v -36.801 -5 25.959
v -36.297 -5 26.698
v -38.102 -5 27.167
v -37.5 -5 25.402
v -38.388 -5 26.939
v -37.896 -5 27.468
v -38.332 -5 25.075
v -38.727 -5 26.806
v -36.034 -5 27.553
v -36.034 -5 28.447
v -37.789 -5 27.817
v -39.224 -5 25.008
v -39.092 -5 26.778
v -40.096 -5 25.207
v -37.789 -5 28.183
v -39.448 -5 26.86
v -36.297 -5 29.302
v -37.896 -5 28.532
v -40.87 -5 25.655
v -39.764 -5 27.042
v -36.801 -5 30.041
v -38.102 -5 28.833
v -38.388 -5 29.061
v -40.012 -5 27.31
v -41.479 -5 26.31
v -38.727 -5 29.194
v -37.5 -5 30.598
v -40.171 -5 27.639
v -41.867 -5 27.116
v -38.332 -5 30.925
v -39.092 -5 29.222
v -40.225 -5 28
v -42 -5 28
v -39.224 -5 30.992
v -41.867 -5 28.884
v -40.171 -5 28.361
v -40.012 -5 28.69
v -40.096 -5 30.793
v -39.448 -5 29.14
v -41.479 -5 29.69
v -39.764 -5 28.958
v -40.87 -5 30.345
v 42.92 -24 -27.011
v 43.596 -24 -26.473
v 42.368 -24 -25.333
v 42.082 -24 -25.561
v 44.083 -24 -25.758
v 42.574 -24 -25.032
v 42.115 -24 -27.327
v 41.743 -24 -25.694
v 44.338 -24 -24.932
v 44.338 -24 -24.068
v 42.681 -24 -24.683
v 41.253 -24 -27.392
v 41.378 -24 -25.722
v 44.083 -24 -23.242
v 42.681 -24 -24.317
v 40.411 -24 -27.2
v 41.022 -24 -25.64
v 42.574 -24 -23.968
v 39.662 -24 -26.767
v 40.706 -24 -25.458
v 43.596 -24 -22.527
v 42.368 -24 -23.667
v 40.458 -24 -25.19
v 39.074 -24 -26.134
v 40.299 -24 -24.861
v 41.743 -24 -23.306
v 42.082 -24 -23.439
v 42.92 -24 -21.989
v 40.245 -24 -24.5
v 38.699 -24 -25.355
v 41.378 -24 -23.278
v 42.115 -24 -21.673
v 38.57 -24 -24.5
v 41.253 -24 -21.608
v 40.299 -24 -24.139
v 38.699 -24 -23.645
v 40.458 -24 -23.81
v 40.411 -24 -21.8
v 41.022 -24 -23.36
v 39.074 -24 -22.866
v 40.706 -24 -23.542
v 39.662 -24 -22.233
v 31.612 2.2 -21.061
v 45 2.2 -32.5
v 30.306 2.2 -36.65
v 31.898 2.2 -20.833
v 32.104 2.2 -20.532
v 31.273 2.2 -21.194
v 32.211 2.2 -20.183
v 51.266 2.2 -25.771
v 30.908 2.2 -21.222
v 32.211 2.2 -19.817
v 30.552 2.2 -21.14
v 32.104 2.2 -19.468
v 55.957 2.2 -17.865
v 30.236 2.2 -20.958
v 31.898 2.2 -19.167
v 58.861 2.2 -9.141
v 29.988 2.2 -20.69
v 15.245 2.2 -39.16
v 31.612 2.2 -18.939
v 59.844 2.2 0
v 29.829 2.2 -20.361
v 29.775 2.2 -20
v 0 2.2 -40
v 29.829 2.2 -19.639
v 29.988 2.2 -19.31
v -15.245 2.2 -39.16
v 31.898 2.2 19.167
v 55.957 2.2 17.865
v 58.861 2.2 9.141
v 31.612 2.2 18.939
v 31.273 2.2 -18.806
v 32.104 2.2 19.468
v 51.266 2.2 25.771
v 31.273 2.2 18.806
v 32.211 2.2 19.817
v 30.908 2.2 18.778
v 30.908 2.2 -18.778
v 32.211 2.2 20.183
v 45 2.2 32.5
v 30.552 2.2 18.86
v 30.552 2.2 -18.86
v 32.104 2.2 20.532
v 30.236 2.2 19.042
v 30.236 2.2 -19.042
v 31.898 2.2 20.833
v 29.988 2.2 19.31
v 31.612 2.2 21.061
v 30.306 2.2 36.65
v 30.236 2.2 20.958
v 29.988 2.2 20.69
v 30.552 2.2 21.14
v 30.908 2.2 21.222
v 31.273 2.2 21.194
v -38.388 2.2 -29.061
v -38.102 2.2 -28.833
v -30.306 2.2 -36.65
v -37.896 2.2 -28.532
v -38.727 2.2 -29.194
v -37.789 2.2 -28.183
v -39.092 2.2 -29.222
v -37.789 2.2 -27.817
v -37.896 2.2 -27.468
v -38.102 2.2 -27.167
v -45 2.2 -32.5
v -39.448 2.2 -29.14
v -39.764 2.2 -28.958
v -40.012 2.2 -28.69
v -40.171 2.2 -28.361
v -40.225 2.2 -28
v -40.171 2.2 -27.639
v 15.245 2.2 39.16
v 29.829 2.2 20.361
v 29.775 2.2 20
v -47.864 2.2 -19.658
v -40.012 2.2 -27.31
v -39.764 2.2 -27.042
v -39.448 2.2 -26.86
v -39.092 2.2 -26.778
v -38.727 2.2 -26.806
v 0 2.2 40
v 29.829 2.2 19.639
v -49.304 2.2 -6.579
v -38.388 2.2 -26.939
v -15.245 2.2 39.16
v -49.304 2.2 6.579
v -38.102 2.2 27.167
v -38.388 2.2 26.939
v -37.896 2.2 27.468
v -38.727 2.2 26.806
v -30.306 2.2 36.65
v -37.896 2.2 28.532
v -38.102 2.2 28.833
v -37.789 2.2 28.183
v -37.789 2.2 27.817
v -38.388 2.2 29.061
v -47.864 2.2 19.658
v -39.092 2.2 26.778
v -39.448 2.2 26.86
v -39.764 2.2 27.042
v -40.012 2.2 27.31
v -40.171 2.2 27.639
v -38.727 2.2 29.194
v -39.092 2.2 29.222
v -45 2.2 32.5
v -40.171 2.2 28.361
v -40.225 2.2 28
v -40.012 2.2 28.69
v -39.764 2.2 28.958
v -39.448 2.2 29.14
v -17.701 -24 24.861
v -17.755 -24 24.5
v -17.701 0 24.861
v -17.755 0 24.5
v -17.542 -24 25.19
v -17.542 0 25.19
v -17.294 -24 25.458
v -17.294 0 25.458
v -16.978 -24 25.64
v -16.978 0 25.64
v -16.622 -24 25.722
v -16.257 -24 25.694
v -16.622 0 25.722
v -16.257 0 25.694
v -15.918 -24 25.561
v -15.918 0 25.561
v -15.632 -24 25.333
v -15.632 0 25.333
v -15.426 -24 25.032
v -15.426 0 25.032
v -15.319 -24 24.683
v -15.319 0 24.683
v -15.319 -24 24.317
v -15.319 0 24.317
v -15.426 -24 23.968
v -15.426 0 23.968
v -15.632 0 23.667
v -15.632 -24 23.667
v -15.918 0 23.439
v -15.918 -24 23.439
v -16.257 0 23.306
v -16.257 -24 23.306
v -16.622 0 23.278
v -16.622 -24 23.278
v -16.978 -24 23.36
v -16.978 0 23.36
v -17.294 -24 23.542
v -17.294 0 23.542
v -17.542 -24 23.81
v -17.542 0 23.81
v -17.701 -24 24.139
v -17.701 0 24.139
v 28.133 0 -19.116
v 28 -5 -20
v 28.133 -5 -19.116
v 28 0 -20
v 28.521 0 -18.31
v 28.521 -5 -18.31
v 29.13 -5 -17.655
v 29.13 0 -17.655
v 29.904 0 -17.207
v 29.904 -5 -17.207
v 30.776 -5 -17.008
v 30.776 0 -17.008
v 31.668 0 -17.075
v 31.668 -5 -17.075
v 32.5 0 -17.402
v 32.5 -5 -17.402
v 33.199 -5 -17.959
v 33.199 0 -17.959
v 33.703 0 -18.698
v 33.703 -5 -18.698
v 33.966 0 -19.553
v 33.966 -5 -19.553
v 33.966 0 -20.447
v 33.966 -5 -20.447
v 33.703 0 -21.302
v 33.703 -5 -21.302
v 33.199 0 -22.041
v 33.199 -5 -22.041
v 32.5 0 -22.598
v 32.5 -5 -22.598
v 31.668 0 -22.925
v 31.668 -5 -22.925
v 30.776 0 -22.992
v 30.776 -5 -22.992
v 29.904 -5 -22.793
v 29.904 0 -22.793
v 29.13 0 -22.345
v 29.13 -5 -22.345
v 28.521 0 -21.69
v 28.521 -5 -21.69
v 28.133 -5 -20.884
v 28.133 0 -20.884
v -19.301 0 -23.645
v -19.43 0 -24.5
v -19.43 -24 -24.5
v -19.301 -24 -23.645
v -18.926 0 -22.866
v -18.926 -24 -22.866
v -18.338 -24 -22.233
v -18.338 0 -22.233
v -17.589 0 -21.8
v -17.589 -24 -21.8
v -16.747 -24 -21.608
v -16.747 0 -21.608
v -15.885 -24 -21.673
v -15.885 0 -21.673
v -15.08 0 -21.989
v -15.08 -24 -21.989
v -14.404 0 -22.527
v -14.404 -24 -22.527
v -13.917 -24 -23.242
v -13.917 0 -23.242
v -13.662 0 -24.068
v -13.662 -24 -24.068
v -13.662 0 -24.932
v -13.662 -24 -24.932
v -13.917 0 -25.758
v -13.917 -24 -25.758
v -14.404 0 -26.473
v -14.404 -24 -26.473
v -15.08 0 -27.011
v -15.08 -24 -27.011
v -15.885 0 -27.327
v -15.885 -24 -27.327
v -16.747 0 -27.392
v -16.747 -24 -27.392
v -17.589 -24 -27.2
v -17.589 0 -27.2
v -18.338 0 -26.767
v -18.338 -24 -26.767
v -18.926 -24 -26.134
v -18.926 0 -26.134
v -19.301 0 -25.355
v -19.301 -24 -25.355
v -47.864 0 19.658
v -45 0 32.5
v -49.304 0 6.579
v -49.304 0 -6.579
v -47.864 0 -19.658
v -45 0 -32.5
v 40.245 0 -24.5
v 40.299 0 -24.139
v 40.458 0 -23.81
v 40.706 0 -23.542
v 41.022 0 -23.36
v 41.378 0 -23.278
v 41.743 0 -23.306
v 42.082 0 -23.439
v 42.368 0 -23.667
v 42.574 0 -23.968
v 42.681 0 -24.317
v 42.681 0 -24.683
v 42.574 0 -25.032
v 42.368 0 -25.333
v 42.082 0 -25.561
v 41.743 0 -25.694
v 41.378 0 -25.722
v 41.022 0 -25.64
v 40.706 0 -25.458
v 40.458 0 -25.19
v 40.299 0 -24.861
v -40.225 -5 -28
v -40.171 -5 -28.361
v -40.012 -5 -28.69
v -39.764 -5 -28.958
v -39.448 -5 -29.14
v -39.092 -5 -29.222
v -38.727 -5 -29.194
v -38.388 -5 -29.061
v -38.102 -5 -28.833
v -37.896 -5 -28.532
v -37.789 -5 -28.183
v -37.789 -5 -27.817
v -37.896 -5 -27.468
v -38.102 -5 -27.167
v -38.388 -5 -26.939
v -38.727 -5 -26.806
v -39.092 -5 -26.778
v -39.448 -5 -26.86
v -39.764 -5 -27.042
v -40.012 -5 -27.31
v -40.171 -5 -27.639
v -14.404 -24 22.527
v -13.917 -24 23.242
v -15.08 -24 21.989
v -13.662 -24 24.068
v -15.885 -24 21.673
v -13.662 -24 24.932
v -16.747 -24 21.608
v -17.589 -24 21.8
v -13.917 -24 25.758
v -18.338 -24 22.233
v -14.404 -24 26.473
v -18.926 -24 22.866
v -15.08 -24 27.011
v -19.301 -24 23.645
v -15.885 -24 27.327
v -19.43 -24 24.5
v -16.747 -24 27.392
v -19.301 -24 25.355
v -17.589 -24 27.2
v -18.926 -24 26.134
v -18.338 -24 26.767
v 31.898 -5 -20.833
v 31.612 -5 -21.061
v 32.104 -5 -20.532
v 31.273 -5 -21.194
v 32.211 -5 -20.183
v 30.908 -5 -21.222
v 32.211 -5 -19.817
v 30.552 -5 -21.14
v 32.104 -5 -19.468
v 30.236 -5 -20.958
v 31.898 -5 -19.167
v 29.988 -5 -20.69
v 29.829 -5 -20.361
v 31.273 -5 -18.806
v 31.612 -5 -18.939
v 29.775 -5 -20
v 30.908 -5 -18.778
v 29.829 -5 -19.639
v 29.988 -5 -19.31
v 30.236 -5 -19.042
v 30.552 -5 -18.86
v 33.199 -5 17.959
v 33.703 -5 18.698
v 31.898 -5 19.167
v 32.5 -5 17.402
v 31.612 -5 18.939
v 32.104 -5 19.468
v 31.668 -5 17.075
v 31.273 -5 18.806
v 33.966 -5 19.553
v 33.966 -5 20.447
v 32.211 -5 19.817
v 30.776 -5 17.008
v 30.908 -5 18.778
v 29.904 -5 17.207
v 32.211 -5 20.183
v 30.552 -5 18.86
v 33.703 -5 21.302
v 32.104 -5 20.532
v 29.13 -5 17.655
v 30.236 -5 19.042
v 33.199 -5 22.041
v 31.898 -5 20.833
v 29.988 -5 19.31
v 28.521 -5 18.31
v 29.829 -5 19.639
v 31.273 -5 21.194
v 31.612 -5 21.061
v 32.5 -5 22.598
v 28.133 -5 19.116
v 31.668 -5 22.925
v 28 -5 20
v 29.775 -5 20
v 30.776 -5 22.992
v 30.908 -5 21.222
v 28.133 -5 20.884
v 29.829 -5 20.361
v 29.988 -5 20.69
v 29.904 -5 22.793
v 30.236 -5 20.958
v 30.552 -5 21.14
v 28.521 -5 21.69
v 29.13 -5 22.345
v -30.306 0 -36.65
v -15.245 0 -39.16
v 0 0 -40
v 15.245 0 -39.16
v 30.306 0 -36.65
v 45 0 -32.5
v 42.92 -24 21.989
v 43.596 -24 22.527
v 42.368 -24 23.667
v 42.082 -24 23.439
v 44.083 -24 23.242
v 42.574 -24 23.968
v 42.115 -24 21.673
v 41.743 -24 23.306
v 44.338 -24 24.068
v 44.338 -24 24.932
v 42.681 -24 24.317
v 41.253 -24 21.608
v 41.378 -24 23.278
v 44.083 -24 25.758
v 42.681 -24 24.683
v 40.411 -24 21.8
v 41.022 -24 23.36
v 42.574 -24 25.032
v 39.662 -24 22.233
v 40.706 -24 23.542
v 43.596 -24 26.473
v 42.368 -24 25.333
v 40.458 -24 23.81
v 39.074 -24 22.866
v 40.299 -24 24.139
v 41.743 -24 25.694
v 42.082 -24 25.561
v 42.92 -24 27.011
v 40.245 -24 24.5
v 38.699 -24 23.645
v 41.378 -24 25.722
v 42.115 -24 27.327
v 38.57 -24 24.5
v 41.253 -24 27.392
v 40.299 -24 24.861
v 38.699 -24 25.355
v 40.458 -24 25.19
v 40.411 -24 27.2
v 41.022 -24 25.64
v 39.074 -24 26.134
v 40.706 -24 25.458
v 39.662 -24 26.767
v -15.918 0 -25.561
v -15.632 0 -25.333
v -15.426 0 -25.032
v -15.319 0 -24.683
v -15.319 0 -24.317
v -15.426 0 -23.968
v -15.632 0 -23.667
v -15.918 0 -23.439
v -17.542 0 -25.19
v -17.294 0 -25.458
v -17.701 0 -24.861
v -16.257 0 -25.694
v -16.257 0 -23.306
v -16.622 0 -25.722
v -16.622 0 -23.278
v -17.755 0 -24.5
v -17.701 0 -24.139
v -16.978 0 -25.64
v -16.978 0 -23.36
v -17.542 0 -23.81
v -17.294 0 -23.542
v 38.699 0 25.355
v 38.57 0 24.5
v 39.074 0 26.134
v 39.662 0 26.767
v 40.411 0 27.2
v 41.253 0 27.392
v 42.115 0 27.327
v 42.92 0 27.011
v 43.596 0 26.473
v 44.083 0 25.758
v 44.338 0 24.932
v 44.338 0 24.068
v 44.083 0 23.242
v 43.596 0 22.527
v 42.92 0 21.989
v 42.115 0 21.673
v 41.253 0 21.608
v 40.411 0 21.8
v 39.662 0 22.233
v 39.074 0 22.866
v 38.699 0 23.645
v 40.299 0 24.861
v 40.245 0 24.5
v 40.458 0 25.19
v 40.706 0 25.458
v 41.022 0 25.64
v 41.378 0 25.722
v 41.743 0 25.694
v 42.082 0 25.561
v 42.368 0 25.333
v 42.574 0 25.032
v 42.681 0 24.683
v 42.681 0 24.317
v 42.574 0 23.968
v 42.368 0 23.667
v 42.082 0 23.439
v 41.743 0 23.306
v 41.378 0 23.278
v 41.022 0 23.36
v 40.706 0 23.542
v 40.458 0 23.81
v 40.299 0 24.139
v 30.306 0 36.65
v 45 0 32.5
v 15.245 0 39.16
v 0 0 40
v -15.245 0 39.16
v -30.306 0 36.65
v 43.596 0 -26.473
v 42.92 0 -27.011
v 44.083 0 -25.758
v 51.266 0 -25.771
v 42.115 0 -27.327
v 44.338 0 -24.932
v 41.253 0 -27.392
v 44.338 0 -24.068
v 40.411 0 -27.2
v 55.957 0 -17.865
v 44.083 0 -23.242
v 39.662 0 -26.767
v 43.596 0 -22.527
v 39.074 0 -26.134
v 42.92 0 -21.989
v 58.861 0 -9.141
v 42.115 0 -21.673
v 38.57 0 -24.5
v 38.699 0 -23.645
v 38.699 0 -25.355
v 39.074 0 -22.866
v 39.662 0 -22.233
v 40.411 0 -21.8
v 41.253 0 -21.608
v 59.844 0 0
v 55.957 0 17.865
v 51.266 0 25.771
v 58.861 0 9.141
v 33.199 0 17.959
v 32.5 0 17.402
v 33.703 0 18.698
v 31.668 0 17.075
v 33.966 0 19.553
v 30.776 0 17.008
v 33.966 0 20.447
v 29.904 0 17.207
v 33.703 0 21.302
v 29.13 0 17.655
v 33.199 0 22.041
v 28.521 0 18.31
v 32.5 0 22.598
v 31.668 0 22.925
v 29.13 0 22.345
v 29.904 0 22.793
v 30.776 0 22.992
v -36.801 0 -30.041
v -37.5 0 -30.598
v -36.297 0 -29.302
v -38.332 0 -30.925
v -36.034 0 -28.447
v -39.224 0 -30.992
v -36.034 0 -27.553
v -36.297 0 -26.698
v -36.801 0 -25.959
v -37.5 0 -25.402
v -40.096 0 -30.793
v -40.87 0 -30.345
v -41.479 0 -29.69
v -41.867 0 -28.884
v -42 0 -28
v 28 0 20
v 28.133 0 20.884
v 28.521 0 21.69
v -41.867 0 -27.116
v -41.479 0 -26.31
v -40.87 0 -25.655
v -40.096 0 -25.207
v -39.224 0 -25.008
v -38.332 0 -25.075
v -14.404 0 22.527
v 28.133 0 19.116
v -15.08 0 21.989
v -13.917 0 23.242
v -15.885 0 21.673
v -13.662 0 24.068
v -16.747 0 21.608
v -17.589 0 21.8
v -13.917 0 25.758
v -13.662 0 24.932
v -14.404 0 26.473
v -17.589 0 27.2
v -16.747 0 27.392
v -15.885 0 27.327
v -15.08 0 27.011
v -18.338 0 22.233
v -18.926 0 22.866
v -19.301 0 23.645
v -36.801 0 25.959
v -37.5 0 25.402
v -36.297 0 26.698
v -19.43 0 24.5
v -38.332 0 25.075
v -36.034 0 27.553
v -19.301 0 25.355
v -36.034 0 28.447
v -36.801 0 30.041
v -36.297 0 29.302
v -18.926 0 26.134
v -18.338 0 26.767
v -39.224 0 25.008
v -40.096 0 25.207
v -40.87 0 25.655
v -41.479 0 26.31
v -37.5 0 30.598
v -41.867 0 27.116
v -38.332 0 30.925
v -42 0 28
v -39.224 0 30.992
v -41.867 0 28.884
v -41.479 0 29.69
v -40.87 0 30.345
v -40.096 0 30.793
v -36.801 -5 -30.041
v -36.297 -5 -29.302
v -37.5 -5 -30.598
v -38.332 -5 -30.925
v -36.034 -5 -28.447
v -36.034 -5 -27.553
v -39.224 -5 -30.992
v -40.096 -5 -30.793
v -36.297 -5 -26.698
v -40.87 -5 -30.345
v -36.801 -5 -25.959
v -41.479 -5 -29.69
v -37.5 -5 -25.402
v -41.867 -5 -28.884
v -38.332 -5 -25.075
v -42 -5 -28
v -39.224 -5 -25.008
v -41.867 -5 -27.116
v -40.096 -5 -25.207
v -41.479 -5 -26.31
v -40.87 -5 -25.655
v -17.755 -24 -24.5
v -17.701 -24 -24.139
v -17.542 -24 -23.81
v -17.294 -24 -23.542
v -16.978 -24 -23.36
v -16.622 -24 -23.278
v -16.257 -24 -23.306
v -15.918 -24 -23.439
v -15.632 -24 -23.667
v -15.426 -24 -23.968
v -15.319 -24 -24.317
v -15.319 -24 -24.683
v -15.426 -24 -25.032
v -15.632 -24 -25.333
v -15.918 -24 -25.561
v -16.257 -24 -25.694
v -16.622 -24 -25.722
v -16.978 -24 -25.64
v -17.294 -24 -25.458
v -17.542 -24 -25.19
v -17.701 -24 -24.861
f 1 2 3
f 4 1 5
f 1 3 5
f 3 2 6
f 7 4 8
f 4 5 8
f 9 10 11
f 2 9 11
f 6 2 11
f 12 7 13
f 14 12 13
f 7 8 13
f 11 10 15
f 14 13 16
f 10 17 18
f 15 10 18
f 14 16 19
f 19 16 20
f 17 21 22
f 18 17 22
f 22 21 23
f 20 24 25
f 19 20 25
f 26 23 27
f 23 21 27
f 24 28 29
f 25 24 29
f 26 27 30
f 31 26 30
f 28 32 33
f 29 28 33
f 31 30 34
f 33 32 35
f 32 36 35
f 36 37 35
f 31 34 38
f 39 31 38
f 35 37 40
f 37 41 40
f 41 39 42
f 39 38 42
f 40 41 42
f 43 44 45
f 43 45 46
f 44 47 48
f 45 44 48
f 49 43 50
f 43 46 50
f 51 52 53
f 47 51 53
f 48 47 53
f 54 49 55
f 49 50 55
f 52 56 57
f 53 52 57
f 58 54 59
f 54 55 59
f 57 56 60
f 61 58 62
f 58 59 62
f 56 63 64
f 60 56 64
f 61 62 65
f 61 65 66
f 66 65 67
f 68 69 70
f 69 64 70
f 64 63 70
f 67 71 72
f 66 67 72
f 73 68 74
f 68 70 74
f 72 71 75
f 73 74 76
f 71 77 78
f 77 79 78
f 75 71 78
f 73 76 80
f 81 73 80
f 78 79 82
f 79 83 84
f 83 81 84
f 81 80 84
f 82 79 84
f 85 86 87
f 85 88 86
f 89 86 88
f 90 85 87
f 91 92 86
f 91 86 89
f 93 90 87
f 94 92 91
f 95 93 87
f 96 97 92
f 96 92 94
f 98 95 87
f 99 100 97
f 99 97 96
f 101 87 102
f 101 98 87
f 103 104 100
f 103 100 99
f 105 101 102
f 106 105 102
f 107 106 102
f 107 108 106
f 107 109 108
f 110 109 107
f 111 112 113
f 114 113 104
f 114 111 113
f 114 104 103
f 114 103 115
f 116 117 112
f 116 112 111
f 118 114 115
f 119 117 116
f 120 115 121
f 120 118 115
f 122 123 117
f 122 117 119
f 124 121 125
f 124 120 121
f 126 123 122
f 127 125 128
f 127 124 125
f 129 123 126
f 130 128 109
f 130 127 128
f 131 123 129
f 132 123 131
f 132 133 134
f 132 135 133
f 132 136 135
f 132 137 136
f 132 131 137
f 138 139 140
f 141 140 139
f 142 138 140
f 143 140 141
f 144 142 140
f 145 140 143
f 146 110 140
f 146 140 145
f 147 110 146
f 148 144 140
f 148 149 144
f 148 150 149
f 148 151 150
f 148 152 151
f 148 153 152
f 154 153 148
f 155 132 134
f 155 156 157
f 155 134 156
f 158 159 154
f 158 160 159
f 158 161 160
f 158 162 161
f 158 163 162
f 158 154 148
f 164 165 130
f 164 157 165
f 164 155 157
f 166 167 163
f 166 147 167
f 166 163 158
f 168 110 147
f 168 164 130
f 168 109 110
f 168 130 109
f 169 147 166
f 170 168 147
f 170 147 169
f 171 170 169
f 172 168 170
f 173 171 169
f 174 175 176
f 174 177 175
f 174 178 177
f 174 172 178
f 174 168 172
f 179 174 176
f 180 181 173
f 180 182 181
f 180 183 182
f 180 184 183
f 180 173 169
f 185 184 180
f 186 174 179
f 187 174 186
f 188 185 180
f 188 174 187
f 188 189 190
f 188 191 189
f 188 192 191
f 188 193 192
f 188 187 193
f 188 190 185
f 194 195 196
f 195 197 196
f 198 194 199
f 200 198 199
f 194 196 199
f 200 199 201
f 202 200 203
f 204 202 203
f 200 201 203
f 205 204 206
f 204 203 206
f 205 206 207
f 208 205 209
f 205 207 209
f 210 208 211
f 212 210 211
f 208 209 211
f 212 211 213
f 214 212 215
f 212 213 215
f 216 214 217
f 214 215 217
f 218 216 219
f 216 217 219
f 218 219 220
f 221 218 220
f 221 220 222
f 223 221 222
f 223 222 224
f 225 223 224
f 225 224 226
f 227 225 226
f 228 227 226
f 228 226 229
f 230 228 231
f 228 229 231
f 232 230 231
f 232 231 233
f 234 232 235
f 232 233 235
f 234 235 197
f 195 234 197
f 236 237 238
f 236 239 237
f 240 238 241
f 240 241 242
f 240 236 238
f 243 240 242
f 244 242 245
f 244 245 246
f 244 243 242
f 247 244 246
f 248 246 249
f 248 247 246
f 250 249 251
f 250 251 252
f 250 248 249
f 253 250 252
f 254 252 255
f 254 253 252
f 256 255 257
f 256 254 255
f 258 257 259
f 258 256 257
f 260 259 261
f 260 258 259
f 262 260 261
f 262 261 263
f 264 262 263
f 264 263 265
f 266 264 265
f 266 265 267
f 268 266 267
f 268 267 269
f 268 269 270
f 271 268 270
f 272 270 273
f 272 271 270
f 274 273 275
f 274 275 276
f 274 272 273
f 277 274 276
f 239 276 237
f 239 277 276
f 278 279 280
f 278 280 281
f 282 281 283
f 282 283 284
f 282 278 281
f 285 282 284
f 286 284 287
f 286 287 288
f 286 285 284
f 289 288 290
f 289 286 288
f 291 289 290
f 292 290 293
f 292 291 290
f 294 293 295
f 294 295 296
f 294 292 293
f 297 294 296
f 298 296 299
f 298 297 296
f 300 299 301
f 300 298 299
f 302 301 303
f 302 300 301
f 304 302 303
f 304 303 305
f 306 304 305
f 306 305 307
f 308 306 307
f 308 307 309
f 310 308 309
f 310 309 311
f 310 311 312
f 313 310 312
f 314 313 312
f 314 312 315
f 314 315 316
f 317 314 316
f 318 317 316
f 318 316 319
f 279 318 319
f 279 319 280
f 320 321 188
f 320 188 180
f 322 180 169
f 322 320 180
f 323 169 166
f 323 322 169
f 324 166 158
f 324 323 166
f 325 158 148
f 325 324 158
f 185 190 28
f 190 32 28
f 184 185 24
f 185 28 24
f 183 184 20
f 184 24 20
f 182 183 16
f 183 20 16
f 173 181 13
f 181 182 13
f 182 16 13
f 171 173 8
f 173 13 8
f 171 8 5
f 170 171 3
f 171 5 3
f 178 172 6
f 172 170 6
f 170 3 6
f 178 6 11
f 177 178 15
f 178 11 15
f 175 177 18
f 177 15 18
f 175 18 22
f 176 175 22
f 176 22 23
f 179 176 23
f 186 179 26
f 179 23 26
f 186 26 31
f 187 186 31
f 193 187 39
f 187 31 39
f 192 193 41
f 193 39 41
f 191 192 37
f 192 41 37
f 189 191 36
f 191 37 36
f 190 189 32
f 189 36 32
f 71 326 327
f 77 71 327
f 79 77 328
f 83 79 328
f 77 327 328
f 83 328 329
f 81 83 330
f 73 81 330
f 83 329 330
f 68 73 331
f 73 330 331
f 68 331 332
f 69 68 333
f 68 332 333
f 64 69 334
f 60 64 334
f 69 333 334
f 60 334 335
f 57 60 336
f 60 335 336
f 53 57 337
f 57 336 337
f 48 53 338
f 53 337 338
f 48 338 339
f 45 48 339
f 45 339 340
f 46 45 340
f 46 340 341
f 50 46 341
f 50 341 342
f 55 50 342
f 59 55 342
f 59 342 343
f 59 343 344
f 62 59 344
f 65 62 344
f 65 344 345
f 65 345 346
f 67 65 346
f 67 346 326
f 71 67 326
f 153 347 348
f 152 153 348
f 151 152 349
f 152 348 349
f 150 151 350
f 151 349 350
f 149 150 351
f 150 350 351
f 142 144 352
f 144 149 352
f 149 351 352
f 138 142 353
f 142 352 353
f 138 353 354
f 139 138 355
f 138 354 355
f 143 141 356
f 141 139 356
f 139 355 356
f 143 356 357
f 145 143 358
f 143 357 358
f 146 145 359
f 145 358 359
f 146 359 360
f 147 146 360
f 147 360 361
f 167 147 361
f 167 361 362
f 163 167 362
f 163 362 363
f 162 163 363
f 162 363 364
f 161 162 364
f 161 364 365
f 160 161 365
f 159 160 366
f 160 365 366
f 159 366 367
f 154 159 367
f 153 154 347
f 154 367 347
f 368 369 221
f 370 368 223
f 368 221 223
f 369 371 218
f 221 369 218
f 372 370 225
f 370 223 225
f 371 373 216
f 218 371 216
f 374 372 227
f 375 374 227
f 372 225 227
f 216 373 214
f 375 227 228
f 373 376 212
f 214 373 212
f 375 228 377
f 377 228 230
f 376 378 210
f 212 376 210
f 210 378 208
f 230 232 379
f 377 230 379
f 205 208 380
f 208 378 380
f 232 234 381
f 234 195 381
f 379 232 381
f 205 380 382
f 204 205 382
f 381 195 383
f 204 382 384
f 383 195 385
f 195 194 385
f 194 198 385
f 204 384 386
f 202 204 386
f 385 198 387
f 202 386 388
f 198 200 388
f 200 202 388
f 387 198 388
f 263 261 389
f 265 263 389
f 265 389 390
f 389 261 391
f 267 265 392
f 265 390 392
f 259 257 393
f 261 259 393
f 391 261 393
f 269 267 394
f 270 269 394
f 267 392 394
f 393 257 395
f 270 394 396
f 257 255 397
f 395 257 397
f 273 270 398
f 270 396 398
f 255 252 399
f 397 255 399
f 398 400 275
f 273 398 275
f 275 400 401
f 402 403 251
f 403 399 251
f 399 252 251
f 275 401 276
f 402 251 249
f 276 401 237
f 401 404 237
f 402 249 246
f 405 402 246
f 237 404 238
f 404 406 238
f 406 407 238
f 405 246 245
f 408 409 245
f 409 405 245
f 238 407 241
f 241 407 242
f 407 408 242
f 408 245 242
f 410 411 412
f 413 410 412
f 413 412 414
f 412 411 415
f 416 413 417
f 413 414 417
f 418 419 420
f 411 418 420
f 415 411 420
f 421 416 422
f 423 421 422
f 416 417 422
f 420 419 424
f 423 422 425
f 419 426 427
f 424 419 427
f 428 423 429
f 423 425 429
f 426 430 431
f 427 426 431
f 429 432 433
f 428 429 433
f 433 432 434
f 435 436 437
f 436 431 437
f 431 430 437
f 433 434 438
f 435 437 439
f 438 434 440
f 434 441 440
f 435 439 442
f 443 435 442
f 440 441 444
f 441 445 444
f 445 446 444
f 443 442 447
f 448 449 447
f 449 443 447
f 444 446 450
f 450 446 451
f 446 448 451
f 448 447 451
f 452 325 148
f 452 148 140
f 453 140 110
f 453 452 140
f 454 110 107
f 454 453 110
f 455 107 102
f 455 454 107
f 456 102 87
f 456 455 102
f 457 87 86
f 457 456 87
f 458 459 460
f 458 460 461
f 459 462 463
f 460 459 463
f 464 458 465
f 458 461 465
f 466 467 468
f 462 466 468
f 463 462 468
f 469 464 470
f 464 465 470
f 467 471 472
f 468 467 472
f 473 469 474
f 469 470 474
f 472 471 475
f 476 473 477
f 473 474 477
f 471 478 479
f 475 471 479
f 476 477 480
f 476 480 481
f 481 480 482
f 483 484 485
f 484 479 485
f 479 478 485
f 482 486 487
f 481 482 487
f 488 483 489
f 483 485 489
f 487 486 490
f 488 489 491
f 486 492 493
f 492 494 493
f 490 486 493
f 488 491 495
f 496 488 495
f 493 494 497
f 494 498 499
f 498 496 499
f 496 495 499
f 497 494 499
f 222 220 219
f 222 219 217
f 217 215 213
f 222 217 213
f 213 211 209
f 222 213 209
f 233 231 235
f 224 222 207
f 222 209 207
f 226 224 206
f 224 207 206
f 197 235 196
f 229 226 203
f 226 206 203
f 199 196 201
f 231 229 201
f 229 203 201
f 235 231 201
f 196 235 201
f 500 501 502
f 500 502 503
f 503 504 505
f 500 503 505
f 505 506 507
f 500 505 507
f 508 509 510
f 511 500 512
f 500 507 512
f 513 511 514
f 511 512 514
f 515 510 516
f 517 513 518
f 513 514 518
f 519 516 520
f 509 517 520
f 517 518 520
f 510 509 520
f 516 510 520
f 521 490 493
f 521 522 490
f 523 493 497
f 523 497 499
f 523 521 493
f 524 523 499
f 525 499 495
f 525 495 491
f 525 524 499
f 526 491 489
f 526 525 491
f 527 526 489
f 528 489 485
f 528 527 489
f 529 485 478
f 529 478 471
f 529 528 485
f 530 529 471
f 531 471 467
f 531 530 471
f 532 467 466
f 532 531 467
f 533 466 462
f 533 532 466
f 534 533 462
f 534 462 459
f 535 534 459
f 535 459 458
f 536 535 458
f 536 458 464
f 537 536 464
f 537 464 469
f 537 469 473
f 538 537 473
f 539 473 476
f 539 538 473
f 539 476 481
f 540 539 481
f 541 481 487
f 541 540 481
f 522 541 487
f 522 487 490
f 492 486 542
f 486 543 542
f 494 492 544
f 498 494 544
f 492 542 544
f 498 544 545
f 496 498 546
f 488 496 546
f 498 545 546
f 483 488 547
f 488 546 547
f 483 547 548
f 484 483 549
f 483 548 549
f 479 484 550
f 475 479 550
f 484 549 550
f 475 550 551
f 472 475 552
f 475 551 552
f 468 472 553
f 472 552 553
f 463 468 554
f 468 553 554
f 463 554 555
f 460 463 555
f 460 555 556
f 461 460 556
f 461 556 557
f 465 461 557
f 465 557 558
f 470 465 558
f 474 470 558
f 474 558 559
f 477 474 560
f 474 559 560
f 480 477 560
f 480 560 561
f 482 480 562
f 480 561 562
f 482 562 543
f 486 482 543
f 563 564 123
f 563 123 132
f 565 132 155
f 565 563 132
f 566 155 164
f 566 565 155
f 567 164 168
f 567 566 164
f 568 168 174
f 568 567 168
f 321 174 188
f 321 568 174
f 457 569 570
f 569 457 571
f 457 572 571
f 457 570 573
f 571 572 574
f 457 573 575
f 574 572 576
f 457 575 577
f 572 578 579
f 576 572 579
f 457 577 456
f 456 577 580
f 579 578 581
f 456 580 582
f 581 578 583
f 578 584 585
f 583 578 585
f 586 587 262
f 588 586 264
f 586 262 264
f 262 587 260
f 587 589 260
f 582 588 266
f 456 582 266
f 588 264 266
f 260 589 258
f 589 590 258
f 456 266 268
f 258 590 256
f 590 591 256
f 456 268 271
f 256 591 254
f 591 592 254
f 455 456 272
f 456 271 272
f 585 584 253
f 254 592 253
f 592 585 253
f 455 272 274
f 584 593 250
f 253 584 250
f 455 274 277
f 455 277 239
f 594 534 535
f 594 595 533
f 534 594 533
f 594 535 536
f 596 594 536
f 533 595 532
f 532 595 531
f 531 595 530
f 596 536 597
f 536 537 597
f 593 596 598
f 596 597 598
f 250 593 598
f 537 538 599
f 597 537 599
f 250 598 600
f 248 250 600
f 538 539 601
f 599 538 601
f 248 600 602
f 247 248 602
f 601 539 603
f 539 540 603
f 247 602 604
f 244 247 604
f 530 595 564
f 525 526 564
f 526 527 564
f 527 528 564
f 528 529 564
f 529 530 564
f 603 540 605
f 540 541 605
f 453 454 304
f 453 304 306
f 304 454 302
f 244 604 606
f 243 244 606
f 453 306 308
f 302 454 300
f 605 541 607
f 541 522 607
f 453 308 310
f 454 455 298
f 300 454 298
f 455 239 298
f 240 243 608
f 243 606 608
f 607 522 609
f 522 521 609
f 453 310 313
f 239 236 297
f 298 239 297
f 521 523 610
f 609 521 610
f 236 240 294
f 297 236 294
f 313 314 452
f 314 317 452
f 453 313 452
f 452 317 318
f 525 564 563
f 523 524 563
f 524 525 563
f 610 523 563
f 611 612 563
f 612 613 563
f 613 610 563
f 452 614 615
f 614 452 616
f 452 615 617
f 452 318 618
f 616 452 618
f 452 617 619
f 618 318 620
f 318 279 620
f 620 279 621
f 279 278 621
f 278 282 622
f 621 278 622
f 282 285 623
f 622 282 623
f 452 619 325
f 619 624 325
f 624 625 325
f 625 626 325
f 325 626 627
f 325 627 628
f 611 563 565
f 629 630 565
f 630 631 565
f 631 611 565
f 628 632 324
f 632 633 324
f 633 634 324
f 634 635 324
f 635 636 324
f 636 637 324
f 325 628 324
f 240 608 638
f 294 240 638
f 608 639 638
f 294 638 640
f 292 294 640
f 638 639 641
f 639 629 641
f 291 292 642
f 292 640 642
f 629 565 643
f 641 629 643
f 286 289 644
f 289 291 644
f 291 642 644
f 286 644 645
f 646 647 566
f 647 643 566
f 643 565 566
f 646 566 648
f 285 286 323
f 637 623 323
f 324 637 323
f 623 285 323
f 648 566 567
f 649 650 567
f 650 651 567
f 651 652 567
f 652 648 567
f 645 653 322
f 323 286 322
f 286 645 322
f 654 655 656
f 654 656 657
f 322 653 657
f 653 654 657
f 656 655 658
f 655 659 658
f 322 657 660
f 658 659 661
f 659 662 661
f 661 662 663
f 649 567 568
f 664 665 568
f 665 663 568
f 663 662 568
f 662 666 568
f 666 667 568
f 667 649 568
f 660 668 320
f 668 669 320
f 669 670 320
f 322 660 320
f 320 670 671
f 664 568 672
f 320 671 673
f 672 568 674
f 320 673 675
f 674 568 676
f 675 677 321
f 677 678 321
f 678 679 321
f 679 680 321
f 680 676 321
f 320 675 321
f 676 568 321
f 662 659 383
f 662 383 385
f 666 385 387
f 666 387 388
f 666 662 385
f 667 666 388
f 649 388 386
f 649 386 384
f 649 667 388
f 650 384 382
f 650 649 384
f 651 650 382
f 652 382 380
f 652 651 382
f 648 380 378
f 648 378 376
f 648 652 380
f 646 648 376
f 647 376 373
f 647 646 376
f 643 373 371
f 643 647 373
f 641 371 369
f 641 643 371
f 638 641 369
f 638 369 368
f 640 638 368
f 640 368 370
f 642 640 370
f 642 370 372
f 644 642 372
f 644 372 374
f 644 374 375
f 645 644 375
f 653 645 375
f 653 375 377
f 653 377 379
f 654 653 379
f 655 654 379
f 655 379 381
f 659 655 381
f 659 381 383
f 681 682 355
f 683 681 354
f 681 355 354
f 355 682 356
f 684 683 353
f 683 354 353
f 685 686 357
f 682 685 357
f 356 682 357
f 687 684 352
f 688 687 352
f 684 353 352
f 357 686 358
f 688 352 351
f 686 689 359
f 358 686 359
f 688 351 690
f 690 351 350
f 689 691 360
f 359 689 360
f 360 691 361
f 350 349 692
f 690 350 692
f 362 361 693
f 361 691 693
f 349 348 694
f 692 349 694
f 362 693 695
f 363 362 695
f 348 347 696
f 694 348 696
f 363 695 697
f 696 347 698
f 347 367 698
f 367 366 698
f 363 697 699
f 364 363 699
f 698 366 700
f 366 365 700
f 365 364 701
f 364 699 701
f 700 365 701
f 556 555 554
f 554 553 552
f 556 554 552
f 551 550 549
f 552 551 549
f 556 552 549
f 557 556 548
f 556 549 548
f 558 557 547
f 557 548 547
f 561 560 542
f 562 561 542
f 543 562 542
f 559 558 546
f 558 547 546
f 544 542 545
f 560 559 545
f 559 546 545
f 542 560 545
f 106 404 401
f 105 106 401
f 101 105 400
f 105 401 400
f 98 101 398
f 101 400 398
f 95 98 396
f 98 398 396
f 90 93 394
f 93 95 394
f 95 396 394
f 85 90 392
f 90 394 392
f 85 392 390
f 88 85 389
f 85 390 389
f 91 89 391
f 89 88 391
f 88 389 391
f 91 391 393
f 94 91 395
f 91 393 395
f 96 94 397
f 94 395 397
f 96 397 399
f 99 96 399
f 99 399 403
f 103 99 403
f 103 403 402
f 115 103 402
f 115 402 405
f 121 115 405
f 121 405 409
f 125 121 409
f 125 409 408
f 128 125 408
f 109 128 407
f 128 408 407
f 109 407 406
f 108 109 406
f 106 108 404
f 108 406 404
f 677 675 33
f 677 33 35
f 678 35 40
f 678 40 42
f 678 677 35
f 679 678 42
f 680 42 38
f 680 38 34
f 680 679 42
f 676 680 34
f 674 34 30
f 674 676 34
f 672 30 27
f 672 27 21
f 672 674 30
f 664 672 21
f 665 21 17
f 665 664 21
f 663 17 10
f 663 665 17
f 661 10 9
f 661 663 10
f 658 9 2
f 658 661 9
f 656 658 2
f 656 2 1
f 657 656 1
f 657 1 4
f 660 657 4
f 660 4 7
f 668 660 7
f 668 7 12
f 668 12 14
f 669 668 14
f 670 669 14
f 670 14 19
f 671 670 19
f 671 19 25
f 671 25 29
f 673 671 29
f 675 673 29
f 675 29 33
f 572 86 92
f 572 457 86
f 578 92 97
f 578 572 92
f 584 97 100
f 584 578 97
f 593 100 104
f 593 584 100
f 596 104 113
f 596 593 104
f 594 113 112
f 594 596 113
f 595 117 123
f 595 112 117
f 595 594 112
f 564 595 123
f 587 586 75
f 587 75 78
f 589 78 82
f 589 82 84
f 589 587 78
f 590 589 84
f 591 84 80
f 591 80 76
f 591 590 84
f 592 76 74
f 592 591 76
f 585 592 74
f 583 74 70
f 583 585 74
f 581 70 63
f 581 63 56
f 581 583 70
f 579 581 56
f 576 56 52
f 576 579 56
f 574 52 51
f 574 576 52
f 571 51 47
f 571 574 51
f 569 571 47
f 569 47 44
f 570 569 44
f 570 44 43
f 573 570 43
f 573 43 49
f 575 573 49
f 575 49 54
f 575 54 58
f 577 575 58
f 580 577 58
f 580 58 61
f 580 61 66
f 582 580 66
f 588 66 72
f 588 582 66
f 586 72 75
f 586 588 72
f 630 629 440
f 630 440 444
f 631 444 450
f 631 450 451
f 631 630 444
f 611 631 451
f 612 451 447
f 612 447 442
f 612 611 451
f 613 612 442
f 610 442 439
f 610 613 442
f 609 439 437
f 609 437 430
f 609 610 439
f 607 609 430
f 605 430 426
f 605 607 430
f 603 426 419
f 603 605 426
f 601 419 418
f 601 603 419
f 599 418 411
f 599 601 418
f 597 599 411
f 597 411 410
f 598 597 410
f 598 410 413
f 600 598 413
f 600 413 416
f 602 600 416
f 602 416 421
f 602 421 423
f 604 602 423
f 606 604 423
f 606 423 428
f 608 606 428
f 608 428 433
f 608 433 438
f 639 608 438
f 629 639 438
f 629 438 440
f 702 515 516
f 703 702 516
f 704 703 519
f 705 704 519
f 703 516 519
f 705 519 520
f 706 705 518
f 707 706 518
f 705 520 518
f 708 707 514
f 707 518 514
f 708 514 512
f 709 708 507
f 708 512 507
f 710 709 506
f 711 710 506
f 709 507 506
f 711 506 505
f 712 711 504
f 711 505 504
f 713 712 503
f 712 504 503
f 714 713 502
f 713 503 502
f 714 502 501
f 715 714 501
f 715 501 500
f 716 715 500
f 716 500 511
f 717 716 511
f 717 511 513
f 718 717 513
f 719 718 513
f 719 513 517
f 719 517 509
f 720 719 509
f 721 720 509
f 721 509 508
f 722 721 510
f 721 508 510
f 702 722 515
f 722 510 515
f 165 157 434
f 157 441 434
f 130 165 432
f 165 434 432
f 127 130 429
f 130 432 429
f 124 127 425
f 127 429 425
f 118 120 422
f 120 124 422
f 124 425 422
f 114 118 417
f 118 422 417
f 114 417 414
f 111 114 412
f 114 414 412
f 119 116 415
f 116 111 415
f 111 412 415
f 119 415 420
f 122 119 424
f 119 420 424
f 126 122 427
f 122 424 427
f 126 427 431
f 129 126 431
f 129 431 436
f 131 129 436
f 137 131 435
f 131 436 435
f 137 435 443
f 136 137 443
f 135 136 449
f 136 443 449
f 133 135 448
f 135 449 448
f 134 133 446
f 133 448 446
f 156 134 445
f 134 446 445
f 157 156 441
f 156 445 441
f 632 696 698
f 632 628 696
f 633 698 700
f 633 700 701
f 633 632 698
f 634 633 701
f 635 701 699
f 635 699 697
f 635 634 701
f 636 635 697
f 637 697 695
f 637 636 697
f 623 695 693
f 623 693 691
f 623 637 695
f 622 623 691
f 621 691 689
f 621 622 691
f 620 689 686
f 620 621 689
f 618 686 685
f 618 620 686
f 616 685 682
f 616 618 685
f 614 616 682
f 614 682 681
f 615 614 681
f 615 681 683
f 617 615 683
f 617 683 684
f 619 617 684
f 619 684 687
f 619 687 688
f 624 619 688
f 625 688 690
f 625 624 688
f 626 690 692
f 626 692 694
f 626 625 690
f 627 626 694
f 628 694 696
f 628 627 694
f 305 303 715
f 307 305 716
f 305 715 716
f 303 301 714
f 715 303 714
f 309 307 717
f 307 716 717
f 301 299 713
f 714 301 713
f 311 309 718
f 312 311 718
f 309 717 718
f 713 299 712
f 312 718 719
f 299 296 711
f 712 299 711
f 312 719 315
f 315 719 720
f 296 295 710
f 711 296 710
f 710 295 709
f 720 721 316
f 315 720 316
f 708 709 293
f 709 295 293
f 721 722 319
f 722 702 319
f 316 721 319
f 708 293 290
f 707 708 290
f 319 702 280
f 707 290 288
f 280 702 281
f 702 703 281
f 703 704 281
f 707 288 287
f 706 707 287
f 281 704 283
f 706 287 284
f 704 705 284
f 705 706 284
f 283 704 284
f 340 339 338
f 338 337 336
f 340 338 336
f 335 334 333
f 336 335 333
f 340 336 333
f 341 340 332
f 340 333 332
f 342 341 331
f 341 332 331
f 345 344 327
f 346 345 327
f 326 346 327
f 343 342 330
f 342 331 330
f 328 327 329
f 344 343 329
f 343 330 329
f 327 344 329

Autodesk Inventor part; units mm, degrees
ref_plane "YZ Plane" through (0, 0, 0) normal (1, 0, 0) x (0, 1, 0)
ref_plane "XZ Plane" through (0, 0, 0) normal (0, 1, 0) x (-1, 0, 0)
sketch "Skizze4" plane through (0, 0, 0) normal (0, 1, 0) x (-1, 0, 0)
  arc A0 (45, -32.5) -> (45, 32.5) centre (-70.5152, 0) ccw
  arc A1 (45, 32.5) -> (-45, 32.5) centre (0, -98.75) ccw
  arc A2 (-45, 32.5) -> (-45, -32.5) centre (-16.8442, 0) ccw
  line L0 (49.4848, 0) -> (-59.8442, 0) construction
  circle A3 centre (39, -28) radius 1.225
  circle A4 centre (39, 28) radius 1.225
  circle A5 centre (-31, 20) radius 1.225
  circle A6 centre (-31, -20) radius 1.225
  circle A7 centre (16.53, -24.5) radius 1.225
  circle A8 centre (16.53, 24.5) radius 1.225
  circle A9 centre (-41.47, 24.5) radius 1.225
  circle A10 centre (-41.47, -24.5) radius 1.225
  line L1 (39, 28) -> (39, -28) construction
  line L2 (39, -28) -> (-31, -20) construction
  line L3 (-31, -20) -> (-31, 20) construction
  line L4 (-31, 20) -> (39, 28) construction
  line L5 (16.53, 24.5) -> (16.53, -24.5) construction
  line L6 (16.53, -24.5) -> (-41.47, -24.5) construction
  line L7 (-41.47, -24.5) -> (-41.47, 24.5) construction
  line L8 (-41.47, 24.5) -> (16.53, 24.5) construction
  line L9 (0, -40) -> (0, 40) construction
  circle A11 centre (16.53, -24.5) radius 2.9
  circle A12 centre (-41.47, -24.5) radius 2.9
  circle A13 centre (-41.47, 24.5) radius 2.9
  circle A14 centre (16.53, 24.5) radius 2.9
  line L10 (45, 32.5) -> (45, -32.5) construction
  line L11 (-45, 32.5) -> (-45, -32.5) construction
  arc A15 (-45, -32.5) -> (45, -32.5) centre (0, 98.75) ccw
  circle A16 centre (-31, -20) radius 3
  circle A17 centre (-31, 20) radius 3
  circle A18 centre (39, 28) radius 3
  circle A19 centre (39, -28) radius 3
  point P0 (0, 0)
  point P1 (0, 0)
  dimension "d19" = 2.45
  dimension "d20" = 5.8
  dimension "d28" = 80
  dimension "d30" = 90
  dimension "d31" = 58
  dimension "d32" = 49
  dimension "d33" = 56
  dimension "d34" = 40
  dimension "d35" = 70
  dimension "d36" = 65
  dimension "d37" = 65
  dimension "d38" = 22.47
  dimension "d39" = 120
  dimension "d40" = 6
  dimension "d41" = 2.45
  dimension "d42" = 43
  dimension "d58" = 6
sketch "Skizze3" plane through (0, 0, 0) normal (0, 1, 0) x (-1, 0, 0)
  line L0 (-220.6772, -144.4743) -> (-220.6772, -104.4743)
  line L1 (-220.6772, -104.4743) -> (-150.6772, -96.4743)
  line L2 (-150.6772, -96.4743) -> (-150.6772, -152.4743)
  line L3 (-150.6772, -152.4743) -> (-220.6772, -144.4743)
  line L4 (-173.154, -148.9743) -> (-231.154, -148.9743)
  line L5 (-231.154, -148.9743) -> (-231.154, -99.9743)
  line L6 (-231.154, -99.9743) -> (-173.154, -99.9743)
  line L7 (-173.154, -99.9743) -> (-173.154, -148.9743)
  circle A0 centre (-231.154, -99.9743) radius 1.35
  circle A1 centre (-231.154, -148.9743) radius 1.35
  circle A2 centre (-173.154, -148.9743) radius 1.35
  circle A3 centre (-173.154, -99.9743) radius 1.35
  arc A4 (-234.6505, -110.3469) -> (-234.6486, -138.3994) centre (-219.7787, -124.3722) ccw
  line L8 (-234.6505, -110.3469) -> (-234.6458, -99.4805)
  arc A5 (-231.5992, -96.4365) -> (-234.6458, -99.4805) centre (-231.6005, -99.4818) ccw
  line L9 (-231.5992, -96.4365) -> (-212.1876, -96.4449)
  arc A6 (-178.6836, -89.0505) -> (-212.1876, -96.4449) centre (-176.7514, -177.4047) ccw
  arc A7 (-149.827, -93.1805) -> (-178.6836, -89.0505) centre (-181.982, -214.9715) ccw
  arc A8 (-147.411, -95.6063) -> (-149.827, -93.1805) centre (-150.6924, -96.4584) ccw
  arc A9 (-143.2995, -124.3735) -> (-147.411, -95.6063) centre (-273.1451, -128.2544) ccw
  arc A10 (-147.4215, -153.3903) -> (-143.2995, -124.3735) centre (-273.1519, -120.7284) ccw
  arc A11 (-149.7866, -155.739) -> (-147.4215, -153.3903) centre (-150.6843, -152.4698) ccw
  arc A12 (-178.6402, -159.8288) -> (-149.7866, -155.739) centre (-181.7729, -33.9036) ccw
  arc A13 (-212.2336, -152.5079) -> (-178.6402, -159.8288) centre (-176.9785, -71.4691) ccw
  line L10 (-231.6452, -152.4995) -> (-212.2336, -152.5079)
  arc A14 (-234.6534, -149.2659) -> (-231.6452, -152.4995) centre (-231.6139, -149.4543) ccw
  line L11 (-234.6534, -149.2659) -> (-234.6486, -138.3994)
  line L12 (-240.2208, -124.3735) -> (-143.2995, -124.3735) construction
  line L13 (-177.3977, -89.0907) -> (-177.3977, -159.7918) construction
  point P0 (-177.3977, -124.4413)
extrude "Extrusion1" add sketch "Skizze4" along normal blind 2.2 contours A15 A2 A1 A0 | A7 | A8 | A9 | A10 | A11 | A12 | A13 | A14 | A16 | A17 | A18 | A19
extrude "Extrusion2" add sketch "Skizze4" against normal blind 24 contours A11 | A12 | A13 | A14
extrude "Extrusion3" add sketch "Skizze4" against normal blind 5 contours A16 | A17 | A18 | A19
ref_plane "Arbeitsebene1" through (41.47, 0, -24.5) normal (-0.3949, 0, -0.9187) x (0, -1, 0)
sketch "Skizze6" plane through (41.47, 0, -24.5) normal (-0.3949, 0, -0.9187) x (0, -1, 0)
  line L0 (24, 1.2564) -> (24.1406, 1.5)
  line L1 (24.1406, 1.5) -> (24.1969, 1.5)
  line L2 (24.1969, 1.5) -> (24.3375, 1.2564)
  line L3 (24.3375, 1.2564) -> (24.3937, 1.2564)
  line L4 (24.45, 1.2564) -> (24.45, 1.5487) construction
  line L5 (24.45, 1.5487) -> (23.8875, 1.5487) construction
  line L6 (23.8875, 1.5487) -> (23.8875, 1.2564) construction
  line L7 (23.8875, 1.2564) -> (23.9437, 1.2564) construction
  line L8 (23.9437, 1.2564) -> (24, 1.2564)
  line L9 (24.3937, 1.2564) -> (24.45, 1.2564) construction
  line L10 (24, 1.2564) -> (24.3375, 1.2564) construction
  line L11 (24.1406, 1.5) -> (24.1687, 1.5487) construction
  line L12 (24.1969, 1.5) -> (24.1687, 1.5487) construction
  line L13 (23.8875, 0) -> (24.45, 0) construction
  line L14 (23.8875, 1.2564) -> (23.9437, 1.159) construction
  line L15 (23.9437, 1.159) -> (24, 1.2564) construction
  line L16 (24.3375, 1.2564) -> (24.3937, 1.159) construction
  line L17 (24.3937, 1.159) -> (24.45, 1.2564) construction
  line L18 (24.1687, 1.2564) -> (24.1687, 1.5487) construction
  line L19 (23.9437, 1.159) -> (24.3937, 1.159) construction
  line L20 (23.8875, 0) -> (23.8875, 1.2564) construction
  line L21 (24.45, 0) -> (24.45, 1.2564) construction
  line L22 (-7.98, 0) -> (29.33, 0) projected
  line L23 (24, 1.225) -> (24, -1.225) projected
  line L24 (24, 1.2564) -> (24.3375, 1.2564)
  line L25 (-2.5375, 12.6525) -> (-2.3969, 12.8961)
  line L26 (-2.3969, 12.8961) -> (-2.3406, 12.8961)
  line L27 (-2.3406, 12.8961) -> (-2.2, 12.6525)
  line L28 (-2.2, 12.6525) -> (-2.1437, 12.6525)
  line L29 (-2.0875, 12.6525) -> (-2.0875, 12.9448) construction
  line L30 (-2.0875, 12.9448) -> (-2.65, 12.9448) construction
  line L31 (-2.65, 12.9448) -> (-2.65, 12.6525) construction
  line L32 (-2.65, 12.6525) -> (-2.5937, 12.6525) construction
  line L33 (-2.5937, 12.6525) -> (-2.5375, 12.6525)
  line L34 (-2.1437, 12.6525) -> (-2.0875, 12.6525) construction
  line L35 (-2.5375, 12.6525) -> (-2.2, 12.6525) construction
  line L36 (-2.3969, 12.8961) -> (-2.3687, 12.9448) construction
  line L37 (-2.3406, 12.8961) -> (-2.3687, 12.9448) construction
  line L38 (-2.65, 11.3961) -> (-2.0875, 11.3961) construction
  line L39 (-2.65, 12.6525) -> (-2.5937, 12.5551) construction
  line L40 (-2.5937, 12.5551) -> (-2.5375, 12.6525) construction
  line L41 (-2.2, 12.6525) -> (-2.1437, 12.5551) construction
  line L42 (-2.1437, 12.5551) -> (-2.0875, 12.6525) construction
  line L43 (-2.3687, 12.6525) -> (-2.3687, 12.9448) construction
  line L44 (-2.5937, 12.5551) -> (-2.1437, 12.5551) construction
  line L45 (-2.65, 11.3961) -> (-2.65, 12.6525) construction
  line L46 (-2.0875, 11.3961) -> (-2.0875, 12.6525) construction
  line L47 (29.33, 11.3961) -> (-7.98, 11.3961) projected
  line L48 (-2.5375, 12.6525) -> (-2.2, 12.6525)
  line L49 (-2.2, 10.1711) -> (-2.2, 12.6211) projected
  dimension "d47" = 60
  dimension "d48" = 3
  dimension "d49" = 0.45
  dimension "d50" = 2.5129
  dimension "d51" = 0.2436
  dimension "d52" = 0.0487
  dimension "d62" = 0
  dimension "d71" = 60
  dimension "d72" = 3
  dimension "d73" = 0.45
  dimension "d74" = 2.5129
  dimension "d75" = 0.2436
  dimension "d76" = 0.0487
  dimension "d82" = 0
equation "\"d53\" = 60deg"
equation "\"d54\" = 3"
equation "\"d55\" = 0.45"
equation "\"d56\" = 2.51288"
equation "\"d57\" = 0.3897"
equation "\"d77\" = 60deg"
equation "\"d78\" = 3"
equation "\"d79\" = 0.45"
equation "\"d80\" = 2.51288"
equation "\"d81\" = 0.3897"
properties part number "_3D-Druck"
